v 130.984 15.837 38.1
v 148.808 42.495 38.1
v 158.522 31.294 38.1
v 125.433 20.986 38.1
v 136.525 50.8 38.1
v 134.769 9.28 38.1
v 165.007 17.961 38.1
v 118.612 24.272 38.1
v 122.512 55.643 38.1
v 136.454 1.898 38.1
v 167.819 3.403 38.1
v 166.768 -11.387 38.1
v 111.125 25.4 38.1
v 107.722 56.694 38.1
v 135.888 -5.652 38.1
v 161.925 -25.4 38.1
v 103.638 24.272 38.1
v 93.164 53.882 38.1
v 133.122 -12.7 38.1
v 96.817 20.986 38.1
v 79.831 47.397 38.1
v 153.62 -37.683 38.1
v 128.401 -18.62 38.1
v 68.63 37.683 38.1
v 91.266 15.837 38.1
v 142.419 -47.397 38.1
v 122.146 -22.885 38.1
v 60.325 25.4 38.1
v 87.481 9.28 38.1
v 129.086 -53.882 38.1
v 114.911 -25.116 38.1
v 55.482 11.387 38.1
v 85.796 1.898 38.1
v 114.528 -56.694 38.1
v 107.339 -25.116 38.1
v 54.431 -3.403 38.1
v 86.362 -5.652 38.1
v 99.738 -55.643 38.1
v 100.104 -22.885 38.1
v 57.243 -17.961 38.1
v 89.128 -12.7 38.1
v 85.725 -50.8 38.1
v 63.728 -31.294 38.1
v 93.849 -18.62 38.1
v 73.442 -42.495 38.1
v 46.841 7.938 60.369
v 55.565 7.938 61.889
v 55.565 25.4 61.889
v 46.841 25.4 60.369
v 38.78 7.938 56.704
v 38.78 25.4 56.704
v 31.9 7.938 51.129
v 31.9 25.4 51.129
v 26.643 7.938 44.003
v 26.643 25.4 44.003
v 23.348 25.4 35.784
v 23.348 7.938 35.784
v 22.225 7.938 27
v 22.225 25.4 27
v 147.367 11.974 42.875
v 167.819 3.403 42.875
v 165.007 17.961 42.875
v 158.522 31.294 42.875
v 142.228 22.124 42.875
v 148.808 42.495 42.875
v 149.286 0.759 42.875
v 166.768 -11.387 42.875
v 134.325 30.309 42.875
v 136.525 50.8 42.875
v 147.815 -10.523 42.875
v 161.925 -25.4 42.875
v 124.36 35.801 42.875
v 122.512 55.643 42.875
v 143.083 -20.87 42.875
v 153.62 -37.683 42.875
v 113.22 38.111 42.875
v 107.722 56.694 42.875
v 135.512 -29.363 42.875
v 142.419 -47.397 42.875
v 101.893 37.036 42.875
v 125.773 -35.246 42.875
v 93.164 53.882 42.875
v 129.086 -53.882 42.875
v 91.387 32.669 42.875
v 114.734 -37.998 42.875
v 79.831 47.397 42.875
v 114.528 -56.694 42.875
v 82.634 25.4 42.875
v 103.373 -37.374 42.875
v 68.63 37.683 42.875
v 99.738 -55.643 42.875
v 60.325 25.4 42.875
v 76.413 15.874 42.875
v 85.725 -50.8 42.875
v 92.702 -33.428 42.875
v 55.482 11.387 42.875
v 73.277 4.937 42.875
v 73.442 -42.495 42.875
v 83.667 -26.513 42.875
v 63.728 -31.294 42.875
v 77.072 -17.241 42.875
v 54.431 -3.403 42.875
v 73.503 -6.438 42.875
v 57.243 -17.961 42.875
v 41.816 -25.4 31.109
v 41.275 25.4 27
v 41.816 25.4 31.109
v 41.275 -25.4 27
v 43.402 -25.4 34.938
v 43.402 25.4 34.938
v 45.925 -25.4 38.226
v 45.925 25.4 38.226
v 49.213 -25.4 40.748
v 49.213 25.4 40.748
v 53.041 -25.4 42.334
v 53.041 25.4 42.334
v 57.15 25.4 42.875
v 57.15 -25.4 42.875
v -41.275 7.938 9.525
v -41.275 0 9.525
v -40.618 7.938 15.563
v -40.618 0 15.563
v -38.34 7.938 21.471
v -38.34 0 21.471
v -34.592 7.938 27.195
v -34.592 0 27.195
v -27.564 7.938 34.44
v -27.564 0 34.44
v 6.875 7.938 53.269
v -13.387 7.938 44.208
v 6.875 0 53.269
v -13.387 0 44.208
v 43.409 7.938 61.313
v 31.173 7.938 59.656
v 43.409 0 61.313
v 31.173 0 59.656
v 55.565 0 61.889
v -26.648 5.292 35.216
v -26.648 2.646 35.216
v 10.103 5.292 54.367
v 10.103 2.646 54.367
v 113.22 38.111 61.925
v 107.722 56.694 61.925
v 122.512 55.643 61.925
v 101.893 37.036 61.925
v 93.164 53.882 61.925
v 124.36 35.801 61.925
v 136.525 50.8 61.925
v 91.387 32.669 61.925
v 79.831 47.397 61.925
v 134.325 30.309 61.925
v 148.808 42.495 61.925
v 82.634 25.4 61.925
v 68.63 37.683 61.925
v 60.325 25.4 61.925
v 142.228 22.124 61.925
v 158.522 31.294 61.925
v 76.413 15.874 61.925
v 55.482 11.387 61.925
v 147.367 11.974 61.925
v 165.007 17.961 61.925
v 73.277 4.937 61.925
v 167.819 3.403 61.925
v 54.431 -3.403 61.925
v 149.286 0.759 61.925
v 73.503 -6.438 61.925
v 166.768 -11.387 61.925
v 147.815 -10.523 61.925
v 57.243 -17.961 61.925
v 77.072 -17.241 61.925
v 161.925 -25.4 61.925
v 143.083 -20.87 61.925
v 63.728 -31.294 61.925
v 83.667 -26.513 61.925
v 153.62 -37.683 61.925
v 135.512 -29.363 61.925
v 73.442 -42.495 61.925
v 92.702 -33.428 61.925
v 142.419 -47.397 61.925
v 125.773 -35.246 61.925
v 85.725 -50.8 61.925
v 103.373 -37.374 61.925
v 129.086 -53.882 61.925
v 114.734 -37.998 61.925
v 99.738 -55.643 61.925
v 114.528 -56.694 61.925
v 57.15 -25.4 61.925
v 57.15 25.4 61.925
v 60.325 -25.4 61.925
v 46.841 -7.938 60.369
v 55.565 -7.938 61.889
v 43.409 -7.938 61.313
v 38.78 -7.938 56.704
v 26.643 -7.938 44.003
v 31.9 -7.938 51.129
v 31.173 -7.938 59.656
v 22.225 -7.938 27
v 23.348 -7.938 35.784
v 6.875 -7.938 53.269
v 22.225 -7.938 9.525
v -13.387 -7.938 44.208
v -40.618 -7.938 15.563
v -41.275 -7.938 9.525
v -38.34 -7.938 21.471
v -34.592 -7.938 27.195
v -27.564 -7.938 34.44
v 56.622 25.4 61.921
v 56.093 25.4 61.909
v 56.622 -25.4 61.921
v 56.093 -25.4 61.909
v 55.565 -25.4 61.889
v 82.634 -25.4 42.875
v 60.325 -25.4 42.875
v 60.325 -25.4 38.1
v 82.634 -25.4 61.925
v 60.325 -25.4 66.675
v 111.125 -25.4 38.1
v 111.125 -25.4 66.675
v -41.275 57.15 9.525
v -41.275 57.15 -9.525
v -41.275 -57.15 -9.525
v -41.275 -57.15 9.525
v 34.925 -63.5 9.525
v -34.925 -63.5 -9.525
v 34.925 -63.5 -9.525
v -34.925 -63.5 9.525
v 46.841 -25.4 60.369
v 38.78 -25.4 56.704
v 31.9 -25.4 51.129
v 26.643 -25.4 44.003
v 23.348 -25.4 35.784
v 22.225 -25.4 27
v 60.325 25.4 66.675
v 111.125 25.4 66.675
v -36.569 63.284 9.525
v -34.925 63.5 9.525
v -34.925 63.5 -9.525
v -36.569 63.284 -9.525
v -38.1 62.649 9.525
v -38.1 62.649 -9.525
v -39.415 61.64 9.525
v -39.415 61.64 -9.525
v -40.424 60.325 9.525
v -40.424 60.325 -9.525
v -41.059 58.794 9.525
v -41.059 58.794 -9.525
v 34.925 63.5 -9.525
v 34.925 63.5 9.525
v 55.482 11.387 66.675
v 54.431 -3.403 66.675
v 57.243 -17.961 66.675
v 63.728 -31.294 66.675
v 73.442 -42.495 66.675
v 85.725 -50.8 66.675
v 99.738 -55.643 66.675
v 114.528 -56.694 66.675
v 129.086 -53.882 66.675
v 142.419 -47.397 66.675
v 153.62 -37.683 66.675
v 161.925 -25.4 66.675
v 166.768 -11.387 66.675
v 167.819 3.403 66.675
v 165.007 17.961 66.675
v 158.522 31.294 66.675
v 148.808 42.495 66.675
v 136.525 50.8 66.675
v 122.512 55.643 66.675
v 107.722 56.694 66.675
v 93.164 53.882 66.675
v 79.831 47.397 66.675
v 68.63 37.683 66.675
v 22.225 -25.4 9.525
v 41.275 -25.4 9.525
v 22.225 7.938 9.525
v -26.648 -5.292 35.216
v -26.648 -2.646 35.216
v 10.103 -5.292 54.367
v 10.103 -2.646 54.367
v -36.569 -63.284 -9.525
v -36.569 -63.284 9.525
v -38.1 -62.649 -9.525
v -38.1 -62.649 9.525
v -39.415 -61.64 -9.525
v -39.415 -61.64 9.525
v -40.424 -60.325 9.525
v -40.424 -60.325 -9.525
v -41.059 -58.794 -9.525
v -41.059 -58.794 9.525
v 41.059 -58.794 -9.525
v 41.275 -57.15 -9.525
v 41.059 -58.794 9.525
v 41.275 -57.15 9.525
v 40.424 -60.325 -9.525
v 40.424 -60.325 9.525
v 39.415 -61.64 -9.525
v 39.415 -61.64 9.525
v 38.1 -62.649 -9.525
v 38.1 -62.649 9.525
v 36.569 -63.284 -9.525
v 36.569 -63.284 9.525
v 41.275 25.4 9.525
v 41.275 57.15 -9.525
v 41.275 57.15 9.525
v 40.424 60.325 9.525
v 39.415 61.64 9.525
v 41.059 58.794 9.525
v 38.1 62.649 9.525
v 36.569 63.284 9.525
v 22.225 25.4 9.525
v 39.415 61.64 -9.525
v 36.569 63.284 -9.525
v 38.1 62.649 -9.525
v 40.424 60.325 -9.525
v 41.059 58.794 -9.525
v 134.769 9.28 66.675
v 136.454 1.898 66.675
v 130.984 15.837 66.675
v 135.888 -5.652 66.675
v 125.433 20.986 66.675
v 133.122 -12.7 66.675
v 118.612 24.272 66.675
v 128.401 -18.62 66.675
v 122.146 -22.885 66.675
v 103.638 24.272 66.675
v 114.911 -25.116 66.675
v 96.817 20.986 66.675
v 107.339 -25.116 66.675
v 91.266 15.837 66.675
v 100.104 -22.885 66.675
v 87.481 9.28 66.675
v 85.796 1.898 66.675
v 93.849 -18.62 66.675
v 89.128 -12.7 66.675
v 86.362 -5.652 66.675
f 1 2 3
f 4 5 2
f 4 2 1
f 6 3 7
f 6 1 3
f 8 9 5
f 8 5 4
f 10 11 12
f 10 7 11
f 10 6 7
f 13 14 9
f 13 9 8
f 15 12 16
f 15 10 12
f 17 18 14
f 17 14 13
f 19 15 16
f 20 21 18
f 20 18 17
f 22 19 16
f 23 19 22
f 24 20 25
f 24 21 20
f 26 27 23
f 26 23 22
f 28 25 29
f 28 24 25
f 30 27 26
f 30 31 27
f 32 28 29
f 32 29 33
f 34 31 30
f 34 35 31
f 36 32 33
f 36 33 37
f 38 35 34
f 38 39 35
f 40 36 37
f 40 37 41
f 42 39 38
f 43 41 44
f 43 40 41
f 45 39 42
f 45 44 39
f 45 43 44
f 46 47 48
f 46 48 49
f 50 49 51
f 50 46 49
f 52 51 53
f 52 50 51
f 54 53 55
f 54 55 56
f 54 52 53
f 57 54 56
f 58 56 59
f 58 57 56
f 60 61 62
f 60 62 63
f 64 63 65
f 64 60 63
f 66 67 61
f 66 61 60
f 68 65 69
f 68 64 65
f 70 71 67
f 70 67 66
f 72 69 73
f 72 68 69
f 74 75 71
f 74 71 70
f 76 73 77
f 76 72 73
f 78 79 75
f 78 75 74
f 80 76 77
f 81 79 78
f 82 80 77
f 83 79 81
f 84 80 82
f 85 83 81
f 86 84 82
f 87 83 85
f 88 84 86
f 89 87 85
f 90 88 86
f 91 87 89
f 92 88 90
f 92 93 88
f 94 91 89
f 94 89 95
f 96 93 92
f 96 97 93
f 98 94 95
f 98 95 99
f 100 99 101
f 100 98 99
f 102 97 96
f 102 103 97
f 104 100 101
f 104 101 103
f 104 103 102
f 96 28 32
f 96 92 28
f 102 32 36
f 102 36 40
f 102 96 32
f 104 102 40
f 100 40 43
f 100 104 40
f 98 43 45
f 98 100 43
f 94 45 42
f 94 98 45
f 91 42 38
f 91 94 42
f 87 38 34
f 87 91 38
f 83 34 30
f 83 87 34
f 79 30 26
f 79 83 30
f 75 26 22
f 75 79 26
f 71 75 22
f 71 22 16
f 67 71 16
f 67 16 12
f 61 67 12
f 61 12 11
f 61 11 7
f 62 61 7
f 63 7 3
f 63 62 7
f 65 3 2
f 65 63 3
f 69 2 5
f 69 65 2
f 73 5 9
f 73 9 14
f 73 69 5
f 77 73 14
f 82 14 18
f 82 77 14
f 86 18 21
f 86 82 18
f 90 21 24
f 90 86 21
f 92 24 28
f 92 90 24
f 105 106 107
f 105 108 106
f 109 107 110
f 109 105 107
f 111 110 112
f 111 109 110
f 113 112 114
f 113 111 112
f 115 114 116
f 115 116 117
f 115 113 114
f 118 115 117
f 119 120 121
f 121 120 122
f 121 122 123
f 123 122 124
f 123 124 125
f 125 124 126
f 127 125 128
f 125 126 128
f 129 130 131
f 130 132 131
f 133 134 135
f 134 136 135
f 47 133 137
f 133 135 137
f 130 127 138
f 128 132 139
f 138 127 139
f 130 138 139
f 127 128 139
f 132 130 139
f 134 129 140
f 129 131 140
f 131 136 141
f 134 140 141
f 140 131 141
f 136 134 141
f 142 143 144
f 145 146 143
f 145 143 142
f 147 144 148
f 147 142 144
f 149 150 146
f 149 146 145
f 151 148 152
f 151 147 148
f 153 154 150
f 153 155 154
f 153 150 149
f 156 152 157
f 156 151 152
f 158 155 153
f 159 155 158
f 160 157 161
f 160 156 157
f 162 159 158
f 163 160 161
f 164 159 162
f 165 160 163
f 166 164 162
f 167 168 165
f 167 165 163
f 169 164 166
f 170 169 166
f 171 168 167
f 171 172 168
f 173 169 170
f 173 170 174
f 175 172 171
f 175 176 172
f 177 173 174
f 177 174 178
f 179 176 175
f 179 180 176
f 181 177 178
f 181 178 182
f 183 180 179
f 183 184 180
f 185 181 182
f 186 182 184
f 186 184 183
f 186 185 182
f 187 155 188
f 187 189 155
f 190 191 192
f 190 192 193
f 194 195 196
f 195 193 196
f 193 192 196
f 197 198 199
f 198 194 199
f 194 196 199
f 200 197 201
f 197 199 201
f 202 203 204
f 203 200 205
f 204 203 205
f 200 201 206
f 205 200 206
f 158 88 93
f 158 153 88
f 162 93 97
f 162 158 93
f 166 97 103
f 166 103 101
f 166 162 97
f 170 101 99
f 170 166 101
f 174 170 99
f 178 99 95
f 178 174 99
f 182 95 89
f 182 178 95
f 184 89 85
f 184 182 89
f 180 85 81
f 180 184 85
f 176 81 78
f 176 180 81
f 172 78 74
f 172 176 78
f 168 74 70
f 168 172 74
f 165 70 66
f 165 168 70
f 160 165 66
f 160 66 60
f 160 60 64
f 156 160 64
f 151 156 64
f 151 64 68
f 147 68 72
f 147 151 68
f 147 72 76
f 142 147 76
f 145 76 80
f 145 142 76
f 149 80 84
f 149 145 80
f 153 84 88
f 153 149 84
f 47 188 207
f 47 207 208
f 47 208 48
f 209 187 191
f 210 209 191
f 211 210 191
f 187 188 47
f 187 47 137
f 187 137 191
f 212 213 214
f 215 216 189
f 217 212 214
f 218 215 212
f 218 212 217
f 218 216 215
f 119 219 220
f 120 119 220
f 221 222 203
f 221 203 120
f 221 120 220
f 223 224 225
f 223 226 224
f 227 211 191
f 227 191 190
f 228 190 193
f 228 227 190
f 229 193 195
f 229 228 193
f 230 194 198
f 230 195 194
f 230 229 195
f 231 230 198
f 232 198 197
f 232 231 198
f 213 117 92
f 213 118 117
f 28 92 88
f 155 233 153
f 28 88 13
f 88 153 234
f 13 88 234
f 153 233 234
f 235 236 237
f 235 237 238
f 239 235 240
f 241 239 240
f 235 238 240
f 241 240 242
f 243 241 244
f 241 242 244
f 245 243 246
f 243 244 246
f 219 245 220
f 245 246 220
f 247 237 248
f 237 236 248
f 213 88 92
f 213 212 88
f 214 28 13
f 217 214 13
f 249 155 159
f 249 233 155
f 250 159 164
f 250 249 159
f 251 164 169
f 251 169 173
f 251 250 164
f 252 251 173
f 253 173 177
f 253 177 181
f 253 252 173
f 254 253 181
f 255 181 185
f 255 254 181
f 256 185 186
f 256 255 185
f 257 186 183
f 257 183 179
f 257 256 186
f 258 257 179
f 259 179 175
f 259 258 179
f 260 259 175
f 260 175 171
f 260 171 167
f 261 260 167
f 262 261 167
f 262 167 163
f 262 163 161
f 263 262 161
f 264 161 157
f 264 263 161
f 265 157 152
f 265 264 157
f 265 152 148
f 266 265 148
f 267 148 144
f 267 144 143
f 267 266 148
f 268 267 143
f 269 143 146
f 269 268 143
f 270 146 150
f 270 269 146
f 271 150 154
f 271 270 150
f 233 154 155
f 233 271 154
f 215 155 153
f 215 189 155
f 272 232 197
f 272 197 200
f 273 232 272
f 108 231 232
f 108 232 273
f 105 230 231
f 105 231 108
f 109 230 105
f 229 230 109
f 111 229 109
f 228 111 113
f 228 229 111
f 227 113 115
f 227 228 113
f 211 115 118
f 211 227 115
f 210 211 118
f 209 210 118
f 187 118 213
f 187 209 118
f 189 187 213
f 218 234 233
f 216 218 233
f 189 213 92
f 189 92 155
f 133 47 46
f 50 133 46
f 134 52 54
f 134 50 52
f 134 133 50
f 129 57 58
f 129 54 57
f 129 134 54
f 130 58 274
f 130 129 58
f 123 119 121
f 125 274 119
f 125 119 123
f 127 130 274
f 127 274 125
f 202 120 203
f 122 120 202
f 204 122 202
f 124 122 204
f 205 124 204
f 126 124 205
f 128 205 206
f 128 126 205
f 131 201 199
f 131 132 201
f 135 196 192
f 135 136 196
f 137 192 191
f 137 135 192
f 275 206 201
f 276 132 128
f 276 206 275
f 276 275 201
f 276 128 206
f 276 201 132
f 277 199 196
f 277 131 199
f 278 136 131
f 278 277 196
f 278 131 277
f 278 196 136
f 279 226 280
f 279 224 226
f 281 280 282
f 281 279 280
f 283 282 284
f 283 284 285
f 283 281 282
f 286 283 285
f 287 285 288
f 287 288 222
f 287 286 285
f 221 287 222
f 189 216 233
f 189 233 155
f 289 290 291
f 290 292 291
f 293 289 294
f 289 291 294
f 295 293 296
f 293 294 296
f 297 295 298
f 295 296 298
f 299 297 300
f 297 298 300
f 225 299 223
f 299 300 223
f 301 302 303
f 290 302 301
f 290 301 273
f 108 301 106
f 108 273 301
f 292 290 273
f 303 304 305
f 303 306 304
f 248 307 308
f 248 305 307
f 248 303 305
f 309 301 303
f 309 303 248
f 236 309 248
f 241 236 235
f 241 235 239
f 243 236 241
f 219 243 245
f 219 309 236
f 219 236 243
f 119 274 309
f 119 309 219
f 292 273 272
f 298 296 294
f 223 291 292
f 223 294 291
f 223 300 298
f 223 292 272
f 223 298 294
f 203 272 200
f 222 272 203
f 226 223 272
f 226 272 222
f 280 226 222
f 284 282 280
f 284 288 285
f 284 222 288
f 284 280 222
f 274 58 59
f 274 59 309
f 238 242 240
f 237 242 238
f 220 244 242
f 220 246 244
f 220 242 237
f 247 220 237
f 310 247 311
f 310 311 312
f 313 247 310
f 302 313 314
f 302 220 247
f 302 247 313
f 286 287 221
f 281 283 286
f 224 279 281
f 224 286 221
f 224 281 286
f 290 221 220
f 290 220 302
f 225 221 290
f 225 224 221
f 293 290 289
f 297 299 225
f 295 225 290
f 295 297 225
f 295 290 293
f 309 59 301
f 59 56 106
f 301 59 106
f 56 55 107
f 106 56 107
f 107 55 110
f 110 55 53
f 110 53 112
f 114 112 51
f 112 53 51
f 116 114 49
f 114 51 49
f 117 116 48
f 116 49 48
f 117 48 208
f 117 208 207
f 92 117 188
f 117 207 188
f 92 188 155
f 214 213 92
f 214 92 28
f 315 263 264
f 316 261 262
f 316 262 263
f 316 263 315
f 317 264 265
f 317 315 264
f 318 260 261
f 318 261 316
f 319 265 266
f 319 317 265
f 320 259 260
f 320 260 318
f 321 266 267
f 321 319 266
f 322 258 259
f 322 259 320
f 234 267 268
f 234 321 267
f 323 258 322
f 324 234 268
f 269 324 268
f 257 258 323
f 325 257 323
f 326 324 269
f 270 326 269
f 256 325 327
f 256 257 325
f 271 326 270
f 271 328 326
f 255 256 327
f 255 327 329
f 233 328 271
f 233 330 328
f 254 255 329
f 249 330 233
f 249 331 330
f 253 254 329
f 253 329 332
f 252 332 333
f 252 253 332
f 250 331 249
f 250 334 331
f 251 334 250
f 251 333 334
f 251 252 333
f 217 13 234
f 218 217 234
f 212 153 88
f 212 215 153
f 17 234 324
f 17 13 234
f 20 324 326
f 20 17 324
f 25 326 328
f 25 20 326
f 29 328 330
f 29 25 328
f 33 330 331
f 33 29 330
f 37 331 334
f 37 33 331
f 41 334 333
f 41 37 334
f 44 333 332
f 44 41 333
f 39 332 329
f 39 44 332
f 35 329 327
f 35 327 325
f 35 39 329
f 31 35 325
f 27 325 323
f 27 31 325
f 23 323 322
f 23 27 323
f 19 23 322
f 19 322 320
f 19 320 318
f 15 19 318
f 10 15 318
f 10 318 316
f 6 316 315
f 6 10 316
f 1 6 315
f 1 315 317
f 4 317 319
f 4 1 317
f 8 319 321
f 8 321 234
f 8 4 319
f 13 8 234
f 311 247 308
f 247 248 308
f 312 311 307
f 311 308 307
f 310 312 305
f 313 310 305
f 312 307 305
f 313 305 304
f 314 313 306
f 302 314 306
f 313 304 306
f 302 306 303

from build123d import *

# Parameters (mm, degrees)
F1_DEPTH = 63.5
F2_DEPTH = 25.4
F3_DEPTH = 7.9375
F5_R     = 6.35


with BuildPart() as f1:
    # F0 (on Front) → F1 (new body, symmetric)
    with BuildSketch(Plane.XZ):
        Polygon((-41.275, -9.525), (41.275, -9.525), (41.275, 9.525), (22.225, 9.525), (-41.275, 9.525), align=None)
    extrude(amount=F1_DEPTH, both=True)

    # F0 (on Front) → F2 (join, symmetric)
    with BuildSketch(Plane.XZ):
        with BuildLine():
            Line((22.225, 9.525), (41.275, 9.525))
            Line((41.275, 9.525), (41.275, 27.0002))
            ThreePointArc((41.275, 27.0002), (45.92468, 38.22552), (57.15, 42.8752))
            Line((57.15, 42.8752), (60.325, 42.8752))
            Line((60.325, 42.8752), (60.325, 61.9252))
            Line((60.325, 61.9252), (57.15, 61.9252))
            ThreePointArc((57.15, 61.9252), (56.357391, 61.916205), (55.56519, 61.889224))
            ThreePointArc((55.56519, 61.889224), (31.900197, 51.129085), (22.225, 27.0002))
            Line((22.225, 27.0002), (22.225, 9.525))
        make_face()
        Polygon((82.634441, 42.8752), (60.325, 42.8752), (60.325, 38.1), (111.125, 38.1), (111.125, 66.675), (60.325, 66.675), (60.325, 61.9252), (82.634441, 61.9252), align=None)
    extrude(amount=F2_DEPTH, both=True)

    # F0 (on Front) → F3 (join, symmetric)
    with BuildSketch(Plane.XZ):
        with BuildLine():
            add(Edge.make_bspline(
                [(-41.275, 9.525), (-42.180944, 36.791354), (10.218859, 61.876368), (55.56519, 61.889224)],
                knots=[0, 0, 0, 0, 110.091028, 110.091028, 110.091028, 110.091028], degree=3))
            Line((-41.275, 9.525), (22.225, 9.525))
            Line((22.225, 9.525), (22.225, 27.0002))
            ThreePointArc((22.225, 27.0002), (31.900197, 51.129085), (55.56519, 61.889224))
        make_face()
    extrude(amount=F3_DEPTH, both=True)

    # F5
    f5_edges = [f1.edges().sort_by_distance(p)[0] for p in [
        (-41.275, -63.5, 0),
        (41.275, -63.5, 0),
        (41.275, 63.5, 0),
        (-41.275, 63.5, 0),
    ]]
    fillet(f5_edges, radius=F5_R)


with BuildPart() as f4:
    # F2_face (on face) → F4 (revolve)
    with BuildSketch(Plane(origin=(91.622215, 25.4, 52.382242), x_dir=(1, 0, 0), z_dir=(0, 1, 0))):
        Polygon((-31.297215, 9.507042), (-8.987774, 9.507042), (-8.987774, -9.542958), (-31.297215, -9.542958), (-31.297215, -14.292758), (19.502785, -14.292758), (19.502785, 14.282242), (-31.297215, 14.282242), align=None)
    revolve(axis=Axis((111.125, 0, 52.3875), (0, 0, 1)))


solid = Compound([f1.part, f4.part])
